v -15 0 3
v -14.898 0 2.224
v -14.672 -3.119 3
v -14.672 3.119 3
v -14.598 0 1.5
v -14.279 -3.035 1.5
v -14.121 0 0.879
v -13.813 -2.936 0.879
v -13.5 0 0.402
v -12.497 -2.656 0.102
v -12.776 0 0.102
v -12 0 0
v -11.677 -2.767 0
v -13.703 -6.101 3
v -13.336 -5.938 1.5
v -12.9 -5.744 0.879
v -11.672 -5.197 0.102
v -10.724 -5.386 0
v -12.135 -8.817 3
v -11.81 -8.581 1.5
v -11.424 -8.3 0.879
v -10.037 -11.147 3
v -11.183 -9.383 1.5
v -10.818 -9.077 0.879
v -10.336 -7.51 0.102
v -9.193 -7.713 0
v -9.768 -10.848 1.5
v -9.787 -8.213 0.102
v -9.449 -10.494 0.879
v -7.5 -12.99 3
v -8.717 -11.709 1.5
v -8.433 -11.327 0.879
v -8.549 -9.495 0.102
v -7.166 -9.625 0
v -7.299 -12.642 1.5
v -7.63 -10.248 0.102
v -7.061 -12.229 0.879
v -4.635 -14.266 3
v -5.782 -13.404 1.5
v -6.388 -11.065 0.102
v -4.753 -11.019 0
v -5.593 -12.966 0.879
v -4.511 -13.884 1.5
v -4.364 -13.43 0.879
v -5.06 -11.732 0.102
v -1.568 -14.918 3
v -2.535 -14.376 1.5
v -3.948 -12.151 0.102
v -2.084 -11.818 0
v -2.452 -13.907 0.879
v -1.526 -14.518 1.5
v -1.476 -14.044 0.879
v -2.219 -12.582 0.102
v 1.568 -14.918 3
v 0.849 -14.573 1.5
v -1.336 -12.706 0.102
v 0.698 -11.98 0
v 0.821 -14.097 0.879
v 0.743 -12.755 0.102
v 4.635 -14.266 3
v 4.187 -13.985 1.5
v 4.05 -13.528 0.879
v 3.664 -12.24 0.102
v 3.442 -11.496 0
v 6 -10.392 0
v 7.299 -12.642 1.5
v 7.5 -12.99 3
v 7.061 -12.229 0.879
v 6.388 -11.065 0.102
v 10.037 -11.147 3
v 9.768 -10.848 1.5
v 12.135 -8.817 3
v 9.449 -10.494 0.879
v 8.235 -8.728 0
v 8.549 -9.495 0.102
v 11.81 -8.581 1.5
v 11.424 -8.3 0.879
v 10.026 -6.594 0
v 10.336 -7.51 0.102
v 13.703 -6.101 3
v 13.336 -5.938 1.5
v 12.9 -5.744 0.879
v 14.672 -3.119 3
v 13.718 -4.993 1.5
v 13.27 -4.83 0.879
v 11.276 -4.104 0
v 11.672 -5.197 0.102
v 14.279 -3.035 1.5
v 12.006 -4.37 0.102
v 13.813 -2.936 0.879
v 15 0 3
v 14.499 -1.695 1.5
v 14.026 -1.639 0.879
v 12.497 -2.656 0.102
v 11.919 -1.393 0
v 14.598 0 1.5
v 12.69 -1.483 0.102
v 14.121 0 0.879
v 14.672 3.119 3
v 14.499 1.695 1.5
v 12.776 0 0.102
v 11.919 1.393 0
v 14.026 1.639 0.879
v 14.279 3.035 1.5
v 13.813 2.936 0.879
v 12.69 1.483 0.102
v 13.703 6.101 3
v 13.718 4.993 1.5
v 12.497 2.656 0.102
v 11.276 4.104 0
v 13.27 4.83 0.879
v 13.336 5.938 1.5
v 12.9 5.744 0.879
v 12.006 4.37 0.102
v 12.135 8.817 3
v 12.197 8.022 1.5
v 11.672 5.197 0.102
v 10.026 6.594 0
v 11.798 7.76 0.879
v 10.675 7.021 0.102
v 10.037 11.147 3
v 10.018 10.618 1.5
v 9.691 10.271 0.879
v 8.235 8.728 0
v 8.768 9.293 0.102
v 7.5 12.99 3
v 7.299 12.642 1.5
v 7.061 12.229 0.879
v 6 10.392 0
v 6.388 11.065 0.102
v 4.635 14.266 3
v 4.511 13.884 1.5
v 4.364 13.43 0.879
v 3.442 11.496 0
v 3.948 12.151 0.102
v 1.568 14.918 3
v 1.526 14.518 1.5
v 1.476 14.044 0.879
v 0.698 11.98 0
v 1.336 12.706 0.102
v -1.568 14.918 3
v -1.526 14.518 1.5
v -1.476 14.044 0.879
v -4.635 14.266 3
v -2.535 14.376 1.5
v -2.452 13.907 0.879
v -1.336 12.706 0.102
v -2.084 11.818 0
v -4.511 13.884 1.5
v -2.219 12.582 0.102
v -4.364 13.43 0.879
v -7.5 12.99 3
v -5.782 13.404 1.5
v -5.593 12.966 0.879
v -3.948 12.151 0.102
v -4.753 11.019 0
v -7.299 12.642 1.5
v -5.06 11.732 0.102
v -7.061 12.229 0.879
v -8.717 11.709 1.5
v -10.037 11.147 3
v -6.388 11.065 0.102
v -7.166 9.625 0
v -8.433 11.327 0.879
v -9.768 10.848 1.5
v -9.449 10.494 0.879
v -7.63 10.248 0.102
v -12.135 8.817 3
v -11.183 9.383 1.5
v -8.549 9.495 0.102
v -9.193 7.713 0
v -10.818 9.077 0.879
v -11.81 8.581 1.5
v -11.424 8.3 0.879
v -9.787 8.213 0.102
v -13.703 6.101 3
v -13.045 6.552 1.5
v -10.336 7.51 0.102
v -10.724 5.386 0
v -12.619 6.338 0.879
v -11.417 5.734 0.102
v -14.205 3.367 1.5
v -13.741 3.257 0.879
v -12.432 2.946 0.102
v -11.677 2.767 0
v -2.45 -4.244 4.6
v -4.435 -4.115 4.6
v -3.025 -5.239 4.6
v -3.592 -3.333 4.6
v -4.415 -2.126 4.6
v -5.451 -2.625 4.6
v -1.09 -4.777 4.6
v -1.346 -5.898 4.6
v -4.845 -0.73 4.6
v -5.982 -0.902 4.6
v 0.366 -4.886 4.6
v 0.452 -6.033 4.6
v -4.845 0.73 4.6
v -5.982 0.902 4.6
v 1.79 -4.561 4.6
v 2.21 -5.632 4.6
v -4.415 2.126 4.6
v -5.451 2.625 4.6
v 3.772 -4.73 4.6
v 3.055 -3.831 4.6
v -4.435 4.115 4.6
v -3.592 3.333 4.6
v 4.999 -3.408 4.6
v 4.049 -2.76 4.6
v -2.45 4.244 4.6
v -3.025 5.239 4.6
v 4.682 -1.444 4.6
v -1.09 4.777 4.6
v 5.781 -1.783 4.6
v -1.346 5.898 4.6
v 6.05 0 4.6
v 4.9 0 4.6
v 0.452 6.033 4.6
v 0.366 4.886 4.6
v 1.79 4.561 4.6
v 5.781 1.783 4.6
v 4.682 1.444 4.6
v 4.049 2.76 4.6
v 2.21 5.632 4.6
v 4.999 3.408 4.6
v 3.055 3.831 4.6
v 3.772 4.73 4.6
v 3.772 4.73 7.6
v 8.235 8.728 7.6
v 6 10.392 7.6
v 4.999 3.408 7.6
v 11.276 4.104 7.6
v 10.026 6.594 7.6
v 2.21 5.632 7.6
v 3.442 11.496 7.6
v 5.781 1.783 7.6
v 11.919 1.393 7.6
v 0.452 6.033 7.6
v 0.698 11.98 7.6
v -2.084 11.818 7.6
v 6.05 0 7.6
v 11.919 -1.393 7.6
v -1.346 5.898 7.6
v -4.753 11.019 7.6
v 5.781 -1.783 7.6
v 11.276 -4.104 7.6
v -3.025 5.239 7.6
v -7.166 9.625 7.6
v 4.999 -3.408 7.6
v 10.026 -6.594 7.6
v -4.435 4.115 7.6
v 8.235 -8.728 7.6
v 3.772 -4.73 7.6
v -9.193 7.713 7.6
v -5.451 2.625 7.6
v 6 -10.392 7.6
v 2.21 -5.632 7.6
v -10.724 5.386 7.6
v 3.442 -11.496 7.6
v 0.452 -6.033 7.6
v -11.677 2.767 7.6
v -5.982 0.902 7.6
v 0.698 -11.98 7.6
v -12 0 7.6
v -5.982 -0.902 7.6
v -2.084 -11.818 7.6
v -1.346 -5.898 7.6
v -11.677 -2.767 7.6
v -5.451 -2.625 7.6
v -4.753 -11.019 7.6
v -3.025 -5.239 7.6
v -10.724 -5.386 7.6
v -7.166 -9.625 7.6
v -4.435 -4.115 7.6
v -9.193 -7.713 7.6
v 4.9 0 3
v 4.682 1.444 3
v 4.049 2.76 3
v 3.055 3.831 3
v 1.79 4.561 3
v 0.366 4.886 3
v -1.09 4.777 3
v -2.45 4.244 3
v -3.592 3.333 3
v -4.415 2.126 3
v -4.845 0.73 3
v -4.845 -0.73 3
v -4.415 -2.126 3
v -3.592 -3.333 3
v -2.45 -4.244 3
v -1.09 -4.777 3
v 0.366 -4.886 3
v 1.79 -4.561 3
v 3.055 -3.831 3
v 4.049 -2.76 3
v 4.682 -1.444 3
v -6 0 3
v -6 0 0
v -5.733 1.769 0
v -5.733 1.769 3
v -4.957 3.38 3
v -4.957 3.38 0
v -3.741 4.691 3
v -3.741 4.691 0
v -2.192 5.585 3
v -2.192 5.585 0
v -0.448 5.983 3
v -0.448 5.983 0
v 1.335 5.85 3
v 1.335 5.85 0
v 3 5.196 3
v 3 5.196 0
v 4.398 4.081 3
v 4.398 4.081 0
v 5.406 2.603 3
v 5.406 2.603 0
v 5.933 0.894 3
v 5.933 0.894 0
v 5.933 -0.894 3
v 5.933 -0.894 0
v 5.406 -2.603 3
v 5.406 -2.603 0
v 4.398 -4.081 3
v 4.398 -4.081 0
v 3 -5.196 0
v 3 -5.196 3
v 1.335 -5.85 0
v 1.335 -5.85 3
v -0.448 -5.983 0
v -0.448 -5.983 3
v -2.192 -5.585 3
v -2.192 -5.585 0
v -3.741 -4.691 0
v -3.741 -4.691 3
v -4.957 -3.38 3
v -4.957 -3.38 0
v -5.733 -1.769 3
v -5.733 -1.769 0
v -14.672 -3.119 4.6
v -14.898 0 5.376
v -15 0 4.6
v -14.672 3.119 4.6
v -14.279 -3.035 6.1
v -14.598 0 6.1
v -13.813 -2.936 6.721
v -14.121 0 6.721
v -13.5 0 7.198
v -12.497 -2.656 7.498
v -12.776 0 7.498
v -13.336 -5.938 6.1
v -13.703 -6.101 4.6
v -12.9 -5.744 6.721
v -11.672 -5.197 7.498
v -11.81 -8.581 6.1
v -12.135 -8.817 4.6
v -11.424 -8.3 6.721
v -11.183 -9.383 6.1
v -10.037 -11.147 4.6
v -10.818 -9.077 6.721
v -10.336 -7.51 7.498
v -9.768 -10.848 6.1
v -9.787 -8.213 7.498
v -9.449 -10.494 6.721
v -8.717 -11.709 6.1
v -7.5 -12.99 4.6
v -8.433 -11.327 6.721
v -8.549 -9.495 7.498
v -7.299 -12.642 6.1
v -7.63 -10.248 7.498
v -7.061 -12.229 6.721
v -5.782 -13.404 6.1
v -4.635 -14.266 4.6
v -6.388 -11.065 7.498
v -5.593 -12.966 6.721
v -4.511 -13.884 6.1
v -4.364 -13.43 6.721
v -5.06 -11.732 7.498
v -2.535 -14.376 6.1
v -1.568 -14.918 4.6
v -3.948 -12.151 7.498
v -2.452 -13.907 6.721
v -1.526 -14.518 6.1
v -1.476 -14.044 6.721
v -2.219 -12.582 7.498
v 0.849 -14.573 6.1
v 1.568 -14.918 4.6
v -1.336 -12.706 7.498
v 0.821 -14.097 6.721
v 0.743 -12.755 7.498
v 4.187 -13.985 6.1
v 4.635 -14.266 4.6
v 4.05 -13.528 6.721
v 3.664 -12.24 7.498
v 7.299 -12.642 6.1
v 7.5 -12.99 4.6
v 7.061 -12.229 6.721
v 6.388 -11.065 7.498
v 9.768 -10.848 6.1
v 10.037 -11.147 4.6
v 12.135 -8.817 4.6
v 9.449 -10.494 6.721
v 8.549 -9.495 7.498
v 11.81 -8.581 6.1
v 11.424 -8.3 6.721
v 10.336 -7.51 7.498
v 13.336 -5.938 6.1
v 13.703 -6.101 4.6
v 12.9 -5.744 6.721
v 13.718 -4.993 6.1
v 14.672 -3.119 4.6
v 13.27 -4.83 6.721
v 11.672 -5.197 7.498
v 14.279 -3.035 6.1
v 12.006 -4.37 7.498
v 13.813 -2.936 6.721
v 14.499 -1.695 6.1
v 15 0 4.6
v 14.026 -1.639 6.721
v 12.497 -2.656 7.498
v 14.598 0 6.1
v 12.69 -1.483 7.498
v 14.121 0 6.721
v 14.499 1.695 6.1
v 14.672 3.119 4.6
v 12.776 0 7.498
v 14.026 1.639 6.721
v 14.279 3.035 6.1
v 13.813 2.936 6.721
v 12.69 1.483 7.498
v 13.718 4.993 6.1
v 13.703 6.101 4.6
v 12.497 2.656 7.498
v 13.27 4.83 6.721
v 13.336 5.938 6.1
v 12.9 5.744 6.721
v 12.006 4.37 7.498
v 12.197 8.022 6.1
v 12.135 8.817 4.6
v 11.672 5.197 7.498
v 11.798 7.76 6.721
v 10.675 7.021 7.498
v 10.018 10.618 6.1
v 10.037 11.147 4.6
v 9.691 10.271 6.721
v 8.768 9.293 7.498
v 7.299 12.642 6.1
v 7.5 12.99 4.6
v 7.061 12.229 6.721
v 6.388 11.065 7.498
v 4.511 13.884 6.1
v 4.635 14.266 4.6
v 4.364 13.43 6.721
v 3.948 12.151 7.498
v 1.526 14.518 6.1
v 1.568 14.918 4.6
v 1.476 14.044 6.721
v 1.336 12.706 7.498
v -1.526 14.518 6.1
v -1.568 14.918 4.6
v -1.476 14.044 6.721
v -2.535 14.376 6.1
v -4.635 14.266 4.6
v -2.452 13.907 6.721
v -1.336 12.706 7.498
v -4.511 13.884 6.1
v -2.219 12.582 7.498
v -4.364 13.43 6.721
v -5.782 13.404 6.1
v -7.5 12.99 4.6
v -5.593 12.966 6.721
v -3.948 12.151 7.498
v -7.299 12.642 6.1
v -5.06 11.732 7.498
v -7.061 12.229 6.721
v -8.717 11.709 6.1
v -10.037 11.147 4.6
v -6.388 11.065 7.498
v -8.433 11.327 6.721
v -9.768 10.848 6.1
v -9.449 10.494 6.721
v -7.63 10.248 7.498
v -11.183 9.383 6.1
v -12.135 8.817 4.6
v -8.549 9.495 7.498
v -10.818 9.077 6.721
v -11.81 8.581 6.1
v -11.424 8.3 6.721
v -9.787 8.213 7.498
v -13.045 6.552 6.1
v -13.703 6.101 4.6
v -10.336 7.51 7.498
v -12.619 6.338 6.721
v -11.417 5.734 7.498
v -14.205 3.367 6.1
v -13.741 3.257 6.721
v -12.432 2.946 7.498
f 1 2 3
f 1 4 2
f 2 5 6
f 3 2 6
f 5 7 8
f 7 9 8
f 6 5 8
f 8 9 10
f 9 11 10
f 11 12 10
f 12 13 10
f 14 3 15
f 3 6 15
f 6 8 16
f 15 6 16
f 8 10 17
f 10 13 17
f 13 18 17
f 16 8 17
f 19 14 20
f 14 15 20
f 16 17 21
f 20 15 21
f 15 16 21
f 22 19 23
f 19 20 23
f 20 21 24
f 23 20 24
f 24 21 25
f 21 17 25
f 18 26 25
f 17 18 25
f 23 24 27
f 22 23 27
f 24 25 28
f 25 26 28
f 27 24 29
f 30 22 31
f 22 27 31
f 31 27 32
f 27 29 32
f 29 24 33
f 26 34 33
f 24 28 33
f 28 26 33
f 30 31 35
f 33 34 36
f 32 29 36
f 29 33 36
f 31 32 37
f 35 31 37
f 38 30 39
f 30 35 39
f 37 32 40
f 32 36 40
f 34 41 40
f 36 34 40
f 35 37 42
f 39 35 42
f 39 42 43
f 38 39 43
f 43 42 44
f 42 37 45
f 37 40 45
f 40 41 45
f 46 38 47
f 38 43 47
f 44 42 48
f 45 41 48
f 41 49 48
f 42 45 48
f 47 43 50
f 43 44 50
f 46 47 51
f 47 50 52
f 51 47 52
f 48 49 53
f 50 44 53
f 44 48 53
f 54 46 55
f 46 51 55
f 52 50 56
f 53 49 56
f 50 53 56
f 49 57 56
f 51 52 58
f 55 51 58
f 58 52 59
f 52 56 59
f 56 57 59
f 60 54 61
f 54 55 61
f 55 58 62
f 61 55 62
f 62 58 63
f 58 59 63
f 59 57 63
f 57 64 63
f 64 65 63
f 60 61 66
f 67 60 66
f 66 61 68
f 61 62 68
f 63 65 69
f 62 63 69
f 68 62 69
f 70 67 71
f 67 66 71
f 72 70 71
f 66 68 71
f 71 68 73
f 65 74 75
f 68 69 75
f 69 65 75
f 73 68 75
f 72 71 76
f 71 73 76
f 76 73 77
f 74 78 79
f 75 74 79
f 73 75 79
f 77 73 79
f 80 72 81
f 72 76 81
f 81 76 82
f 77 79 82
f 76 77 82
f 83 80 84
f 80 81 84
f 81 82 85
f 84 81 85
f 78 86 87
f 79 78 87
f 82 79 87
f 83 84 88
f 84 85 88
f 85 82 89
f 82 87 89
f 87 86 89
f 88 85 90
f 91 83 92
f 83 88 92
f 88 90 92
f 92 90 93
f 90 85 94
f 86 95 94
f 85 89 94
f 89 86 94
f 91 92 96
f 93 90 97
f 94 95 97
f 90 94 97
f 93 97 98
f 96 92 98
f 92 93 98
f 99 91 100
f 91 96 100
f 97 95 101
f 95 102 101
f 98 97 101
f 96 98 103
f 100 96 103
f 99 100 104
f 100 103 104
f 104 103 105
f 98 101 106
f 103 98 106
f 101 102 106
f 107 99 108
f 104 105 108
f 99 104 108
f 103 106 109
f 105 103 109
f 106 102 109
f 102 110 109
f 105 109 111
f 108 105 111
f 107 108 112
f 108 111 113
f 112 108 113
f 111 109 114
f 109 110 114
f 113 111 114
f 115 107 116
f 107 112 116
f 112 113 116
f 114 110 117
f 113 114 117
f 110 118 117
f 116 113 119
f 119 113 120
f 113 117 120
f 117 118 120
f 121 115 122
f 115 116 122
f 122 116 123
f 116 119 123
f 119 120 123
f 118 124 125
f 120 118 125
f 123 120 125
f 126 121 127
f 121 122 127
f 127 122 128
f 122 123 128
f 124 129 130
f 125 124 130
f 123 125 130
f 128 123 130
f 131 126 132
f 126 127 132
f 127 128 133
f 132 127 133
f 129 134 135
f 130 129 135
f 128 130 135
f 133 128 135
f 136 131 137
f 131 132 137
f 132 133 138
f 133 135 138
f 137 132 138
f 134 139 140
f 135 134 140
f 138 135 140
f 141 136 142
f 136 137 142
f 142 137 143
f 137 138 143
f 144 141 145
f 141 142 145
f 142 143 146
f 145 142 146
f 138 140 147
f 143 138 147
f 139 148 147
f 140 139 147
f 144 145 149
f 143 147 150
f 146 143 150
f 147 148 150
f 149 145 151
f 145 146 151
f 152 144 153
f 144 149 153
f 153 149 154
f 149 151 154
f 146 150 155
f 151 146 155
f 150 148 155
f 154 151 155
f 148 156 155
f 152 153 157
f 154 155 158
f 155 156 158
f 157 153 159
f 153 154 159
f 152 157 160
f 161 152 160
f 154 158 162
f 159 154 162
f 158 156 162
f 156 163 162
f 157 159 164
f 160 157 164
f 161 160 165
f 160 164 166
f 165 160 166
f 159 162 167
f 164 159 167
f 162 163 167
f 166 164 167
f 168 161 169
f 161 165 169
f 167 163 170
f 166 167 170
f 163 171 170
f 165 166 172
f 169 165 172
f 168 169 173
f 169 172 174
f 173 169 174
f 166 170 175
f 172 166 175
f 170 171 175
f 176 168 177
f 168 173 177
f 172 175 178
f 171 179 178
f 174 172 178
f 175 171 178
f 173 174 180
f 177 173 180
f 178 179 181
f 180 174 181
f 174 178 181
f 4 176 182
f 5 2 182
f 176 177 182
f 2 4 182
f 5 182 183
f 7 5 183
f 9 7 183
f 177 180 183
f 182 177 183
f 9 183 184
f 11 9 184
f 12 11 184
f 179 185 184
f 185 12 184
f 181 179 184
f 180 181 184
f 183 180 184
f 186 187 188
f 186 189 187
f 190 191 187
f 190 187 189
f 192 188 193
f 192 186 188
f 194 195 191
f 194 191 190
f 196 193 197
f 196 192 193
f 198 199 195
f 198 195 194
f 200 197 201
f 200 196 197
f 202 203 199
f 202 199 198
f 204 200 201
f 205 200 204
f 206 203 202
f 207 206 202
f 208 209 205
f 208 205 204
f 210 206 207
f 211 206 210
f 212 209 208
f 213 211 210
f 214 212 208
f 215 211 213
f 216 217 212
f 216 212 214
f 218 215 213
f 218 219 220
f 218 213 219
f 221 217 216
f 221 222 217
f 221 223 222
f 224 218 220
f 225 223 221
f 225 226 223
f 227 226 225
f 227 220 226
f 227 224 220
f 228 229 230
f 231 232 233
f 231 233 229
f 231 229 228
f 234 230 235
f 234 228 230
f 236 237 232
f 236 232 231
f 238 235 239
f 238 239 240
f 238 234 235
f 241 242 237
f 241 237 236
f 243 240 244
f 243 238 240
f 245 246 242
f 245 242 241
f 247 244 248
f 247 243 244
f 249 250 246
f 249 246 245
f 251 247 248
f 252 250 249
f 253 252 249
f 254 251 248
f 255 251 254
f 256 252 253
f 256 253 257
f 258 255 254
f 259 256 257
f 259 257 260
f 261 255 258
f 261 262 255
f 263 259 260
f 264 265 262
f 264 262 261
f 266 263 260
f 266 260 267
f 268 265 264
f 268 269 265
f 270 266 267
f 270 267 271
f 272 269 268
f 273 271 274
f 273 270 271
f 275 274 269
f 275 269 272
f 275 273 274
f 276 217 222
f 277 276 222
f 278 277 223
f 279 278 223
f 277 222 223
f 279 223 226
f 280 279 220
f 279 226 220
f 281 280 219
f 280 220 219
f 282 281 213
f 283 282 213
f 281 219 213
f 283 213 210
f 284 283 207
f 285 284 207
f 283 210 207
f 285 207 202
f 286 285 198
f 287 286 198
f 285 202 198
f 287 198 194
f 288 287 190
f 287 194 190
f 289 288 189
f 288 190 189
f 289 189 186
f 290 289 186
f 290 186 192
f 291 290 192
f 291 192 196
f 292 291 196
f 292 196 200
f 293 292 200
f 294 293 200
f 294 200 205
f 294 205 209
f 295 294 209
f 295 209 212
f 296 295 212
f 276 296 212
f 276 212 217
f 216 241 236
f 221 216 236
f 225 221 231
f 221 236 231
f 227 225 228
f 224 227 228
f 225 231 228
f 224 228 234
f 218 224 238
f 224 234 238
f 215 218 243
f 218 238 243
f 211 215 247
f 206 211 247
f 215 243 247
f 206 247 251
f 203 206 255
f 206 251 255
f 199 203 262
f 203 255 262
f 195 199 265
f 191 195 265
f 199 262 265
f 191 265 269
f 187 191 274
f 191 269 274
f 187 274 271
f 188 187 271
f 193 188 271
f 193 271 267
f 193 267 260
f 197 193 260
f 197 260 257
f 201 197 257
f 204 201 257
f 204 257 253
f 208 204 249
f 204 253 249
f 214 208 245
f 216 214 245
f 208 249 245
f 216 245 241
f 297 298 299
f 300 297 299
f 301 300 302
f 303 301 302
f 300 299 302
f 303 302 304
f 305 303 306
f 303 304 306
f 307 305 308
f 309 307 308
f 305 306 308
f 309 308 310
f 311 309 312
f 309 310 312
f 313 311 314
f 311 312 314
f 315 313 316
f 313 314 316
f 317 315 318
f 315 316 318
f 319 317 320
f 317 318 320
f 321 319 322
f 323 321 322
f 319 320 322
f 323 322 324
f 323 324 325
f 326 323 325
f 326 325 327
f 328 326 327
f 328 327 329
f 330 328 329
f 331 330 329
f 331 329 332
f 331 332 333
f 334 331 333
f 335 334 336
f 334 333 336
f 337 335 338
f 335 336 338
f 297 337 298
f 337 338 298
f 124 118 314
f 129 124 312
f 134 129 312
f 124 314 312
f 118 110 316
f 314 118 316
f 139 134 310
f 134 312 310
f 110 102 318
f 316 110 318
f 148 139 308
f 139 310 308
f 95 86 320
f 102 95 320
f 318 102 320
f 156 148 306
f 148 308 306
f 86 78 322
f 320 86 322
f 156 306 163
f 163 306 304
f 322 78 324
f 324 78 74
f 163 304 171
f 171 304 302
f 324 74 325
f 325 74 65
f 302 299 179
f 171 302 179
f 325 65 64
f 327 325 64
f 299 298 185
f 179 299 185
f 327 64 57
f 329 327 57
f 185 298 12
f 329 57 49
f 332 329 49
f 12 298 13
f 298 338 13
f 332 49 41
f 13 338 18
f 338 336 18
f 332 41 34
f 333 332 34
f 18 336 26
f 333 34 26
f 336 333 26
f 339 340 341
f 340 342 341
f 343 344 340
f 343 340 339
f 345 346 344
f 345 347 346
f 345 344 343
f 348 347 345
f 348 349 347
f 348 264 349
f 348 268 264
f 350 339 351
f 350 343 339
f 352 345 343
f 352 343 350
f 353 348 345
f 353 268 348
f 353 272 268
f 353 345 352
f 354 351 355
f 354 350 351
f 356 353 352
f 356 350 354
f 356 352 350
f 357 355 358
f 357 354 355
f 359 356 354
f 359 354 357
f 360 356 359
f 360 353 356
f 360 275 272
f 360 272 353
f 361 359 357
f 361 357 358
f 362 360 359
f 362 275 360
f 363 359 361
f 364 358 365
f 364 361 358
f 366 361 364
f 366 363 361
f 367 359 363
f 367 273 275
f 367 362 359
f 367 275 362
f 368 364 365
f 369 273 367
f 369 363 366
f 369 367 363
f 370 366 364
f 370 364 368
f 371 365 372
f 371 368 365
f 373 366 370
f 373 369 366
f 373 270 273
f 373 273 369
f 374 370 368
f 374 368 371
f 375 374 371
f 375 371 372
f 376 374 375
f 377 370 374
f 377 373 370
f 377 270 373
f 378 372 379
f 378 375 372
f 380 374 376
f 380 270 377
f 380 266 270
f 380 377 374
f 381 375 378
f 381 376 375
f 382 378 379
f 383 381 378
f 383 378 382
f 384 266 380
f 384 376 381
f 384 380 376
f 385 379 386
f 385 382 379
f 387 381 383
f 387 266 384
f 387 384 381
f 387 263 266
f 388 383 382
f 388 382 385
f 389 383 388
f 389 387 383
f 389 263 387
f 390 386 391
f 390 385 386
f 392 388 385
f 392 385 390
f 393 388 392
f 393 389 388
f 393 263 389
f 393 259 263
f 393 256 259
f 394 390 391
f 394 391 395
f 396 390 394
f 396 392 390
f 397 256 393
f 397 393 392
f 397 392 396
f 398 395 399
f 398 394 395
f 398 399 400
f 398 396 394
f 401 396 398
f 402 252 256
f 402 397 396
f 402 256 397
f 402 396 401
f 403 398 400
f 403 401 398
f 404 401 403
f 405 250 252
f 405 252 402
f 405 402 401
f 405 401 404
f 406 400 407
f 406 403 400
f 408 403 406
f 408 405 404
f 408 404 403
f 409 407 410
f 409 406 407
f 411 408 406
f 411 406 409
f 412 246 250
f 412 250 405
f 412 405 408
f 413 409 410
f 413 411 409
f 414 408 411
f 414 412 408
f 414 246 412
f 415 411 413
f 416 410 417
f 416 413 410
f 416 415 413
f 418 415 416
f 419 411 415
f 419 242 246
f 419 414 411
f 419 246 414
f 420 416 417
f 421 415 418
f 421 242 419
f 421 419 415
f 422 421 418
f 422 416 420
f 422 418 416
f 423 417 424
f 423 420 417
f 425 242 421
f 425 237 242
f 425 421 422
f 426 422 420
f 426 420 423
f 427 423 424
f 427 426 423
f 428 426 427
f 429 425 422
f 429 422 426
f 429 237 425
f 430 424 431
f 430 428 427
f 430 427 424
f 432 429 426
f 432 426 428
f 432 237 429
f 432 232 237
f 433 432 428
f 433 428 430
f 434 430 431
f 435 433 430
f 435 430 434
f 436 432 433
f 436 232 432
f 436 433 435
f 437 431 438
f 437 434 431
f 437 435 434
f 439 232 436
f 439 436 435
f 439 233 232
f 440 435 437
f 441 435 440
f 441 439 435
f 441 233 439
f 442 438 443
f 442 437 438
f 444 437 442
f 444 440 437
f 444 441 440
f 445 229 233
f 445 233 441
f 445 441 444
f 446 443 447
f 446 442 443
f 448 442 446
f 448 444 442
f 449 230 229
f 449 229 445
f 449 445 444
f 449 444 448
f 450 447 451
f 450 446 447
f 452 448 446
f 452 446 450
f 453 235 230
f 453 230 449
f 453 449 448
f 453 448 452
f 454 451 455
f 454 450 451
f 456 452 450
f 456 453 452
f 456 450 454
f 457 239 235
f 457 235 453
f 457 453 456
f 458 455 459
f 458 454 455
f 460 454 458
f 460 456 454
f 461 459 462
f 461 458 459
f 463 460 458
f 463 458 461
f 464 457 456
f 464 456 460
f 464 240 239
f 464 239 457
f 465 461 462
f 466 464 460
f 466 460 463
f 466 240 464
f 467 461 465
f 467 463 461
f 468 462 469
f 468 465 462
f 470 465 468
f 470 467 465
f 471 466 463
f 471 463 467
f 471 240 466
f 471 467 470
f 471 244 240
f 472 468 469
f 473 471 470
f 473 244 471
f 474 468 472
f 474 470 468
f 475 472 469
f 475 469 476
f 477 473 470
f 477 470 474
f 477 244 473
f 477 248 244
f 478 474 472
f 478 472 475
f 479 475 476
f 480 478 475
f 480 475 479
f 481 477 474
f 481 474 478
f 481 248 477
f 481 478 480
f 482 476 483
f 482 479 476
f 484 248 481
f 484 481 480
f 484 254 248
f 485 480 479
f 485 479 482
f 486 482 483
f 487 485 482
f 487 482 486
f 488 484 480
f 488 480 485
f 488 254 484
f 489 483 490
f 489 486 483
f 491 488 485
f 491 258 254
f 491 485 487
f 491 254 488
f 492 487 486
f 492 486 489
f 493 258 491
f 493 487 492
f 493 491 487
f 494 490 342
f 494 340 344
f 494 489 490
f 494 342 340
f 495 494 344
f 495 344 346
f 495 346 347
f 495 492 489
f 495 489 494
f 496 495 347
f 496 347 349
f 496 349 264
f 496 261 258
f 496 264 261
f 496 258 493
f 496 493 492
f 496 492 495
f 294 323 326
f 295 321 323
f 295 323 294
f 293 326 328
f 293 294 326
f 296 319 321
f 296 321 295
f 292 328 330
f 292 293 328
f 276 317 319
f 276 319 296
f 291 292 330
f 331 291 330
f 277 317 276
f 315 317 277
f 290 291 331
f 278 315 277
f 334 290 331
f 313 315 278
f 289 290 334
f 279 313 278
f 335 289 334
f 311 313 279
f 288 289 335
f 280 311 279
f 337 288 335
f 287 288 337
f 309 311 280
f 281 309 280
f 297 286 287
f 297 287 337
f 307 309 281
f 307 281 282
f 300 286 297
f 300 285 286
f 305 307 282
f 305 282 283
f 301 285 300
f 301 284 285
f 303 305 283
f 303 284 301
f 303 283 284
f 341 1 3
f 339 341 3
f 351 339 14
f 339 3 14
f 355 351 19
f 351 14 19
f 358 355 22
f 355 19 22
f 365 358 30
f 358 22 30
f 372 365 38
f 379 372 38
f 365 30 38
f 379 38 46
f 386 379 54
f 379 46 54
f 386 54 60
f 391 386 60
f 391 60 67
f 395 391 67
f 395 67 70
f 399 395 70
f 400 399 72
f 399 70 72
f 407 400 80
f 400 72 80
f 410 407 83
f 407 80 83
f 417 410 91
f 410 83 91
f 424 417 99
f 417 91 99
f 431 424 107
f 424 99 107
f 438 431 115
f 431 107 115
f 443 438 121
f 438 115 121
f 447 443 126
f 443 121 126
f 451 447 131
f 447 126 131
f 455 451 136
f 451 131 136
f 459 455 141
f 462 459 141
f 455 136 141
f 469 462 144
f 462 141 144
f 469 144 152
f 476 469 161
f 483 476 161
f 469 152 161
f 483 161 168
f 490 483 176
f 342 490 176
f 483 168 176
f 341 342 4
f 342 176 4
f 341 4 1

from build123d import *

# Parameters (mm, degrees)
SKETCH_1_R          = 15
EXTRUDE_1_DEPTH     = 7.6
SKETCH_2_R          = 6.05
CUT_EXTRUDE_1_DEPTH = 3
SKETCH_3_R          = 6
CUT_EXTRUDE_2_DEPTH = 3
SKETCH_4_R          = 4.9
CUT_EXTRUDE_3_DEPTH = 22.706220307
FILLET_1_R          = 3


with BuildPart() as part:
    # 草图1 → 凸台-拉伸1 (new body)
    with BuildSketch(Plane.XY):
        with Locations(Location((0, 0, 0), (0, 0, 180))):
            Circle(SKETCH_1_R)
    extrude(amount=EXTRUDE_1_DEPTH)

    # 草图2 → 切除-拉伸1 (cut)
    with BuildSketch(Plane.XY.offset(7.6)):
        Circle(SKETCH_2_R)
    extrude(amount=-CUT_EXTRUDE_1_DEPTH, mode=Mode.SUBTRACT)

    # 草图3 → 切除-拉伸2 (cut)
    with BuildSketch(Plane(origin=(0, 0, 0), x_dir=(-1, 0, 0), z_dir=(0, 0, -1))):
        Circle(SKETCH_3_R)
    extrude(amount=-CUT_EXTRUDE_2_DEPTH, mode=Mode.SUBTRACT)

    # 草图4 → 切除-拉伸3 (cut, through all)
    with BuildSketch(Plane.XY.offset(4.6)):
        Circle(SKETCH_4_R)
    extrude(amount=-CUT_EXTRUDE_3_DEPTH, mode=Mode.SUBTRACT)

    # 圆角1
    fillet_1_edges = [part.edges().sort_by_distance(p)[0] for p in [
        (15, 0, 0),
        (15, 0, 7.6),
    ]]
    fillet(fillet_1_edges, radius=FILLET_1_R)


solid = part.part
